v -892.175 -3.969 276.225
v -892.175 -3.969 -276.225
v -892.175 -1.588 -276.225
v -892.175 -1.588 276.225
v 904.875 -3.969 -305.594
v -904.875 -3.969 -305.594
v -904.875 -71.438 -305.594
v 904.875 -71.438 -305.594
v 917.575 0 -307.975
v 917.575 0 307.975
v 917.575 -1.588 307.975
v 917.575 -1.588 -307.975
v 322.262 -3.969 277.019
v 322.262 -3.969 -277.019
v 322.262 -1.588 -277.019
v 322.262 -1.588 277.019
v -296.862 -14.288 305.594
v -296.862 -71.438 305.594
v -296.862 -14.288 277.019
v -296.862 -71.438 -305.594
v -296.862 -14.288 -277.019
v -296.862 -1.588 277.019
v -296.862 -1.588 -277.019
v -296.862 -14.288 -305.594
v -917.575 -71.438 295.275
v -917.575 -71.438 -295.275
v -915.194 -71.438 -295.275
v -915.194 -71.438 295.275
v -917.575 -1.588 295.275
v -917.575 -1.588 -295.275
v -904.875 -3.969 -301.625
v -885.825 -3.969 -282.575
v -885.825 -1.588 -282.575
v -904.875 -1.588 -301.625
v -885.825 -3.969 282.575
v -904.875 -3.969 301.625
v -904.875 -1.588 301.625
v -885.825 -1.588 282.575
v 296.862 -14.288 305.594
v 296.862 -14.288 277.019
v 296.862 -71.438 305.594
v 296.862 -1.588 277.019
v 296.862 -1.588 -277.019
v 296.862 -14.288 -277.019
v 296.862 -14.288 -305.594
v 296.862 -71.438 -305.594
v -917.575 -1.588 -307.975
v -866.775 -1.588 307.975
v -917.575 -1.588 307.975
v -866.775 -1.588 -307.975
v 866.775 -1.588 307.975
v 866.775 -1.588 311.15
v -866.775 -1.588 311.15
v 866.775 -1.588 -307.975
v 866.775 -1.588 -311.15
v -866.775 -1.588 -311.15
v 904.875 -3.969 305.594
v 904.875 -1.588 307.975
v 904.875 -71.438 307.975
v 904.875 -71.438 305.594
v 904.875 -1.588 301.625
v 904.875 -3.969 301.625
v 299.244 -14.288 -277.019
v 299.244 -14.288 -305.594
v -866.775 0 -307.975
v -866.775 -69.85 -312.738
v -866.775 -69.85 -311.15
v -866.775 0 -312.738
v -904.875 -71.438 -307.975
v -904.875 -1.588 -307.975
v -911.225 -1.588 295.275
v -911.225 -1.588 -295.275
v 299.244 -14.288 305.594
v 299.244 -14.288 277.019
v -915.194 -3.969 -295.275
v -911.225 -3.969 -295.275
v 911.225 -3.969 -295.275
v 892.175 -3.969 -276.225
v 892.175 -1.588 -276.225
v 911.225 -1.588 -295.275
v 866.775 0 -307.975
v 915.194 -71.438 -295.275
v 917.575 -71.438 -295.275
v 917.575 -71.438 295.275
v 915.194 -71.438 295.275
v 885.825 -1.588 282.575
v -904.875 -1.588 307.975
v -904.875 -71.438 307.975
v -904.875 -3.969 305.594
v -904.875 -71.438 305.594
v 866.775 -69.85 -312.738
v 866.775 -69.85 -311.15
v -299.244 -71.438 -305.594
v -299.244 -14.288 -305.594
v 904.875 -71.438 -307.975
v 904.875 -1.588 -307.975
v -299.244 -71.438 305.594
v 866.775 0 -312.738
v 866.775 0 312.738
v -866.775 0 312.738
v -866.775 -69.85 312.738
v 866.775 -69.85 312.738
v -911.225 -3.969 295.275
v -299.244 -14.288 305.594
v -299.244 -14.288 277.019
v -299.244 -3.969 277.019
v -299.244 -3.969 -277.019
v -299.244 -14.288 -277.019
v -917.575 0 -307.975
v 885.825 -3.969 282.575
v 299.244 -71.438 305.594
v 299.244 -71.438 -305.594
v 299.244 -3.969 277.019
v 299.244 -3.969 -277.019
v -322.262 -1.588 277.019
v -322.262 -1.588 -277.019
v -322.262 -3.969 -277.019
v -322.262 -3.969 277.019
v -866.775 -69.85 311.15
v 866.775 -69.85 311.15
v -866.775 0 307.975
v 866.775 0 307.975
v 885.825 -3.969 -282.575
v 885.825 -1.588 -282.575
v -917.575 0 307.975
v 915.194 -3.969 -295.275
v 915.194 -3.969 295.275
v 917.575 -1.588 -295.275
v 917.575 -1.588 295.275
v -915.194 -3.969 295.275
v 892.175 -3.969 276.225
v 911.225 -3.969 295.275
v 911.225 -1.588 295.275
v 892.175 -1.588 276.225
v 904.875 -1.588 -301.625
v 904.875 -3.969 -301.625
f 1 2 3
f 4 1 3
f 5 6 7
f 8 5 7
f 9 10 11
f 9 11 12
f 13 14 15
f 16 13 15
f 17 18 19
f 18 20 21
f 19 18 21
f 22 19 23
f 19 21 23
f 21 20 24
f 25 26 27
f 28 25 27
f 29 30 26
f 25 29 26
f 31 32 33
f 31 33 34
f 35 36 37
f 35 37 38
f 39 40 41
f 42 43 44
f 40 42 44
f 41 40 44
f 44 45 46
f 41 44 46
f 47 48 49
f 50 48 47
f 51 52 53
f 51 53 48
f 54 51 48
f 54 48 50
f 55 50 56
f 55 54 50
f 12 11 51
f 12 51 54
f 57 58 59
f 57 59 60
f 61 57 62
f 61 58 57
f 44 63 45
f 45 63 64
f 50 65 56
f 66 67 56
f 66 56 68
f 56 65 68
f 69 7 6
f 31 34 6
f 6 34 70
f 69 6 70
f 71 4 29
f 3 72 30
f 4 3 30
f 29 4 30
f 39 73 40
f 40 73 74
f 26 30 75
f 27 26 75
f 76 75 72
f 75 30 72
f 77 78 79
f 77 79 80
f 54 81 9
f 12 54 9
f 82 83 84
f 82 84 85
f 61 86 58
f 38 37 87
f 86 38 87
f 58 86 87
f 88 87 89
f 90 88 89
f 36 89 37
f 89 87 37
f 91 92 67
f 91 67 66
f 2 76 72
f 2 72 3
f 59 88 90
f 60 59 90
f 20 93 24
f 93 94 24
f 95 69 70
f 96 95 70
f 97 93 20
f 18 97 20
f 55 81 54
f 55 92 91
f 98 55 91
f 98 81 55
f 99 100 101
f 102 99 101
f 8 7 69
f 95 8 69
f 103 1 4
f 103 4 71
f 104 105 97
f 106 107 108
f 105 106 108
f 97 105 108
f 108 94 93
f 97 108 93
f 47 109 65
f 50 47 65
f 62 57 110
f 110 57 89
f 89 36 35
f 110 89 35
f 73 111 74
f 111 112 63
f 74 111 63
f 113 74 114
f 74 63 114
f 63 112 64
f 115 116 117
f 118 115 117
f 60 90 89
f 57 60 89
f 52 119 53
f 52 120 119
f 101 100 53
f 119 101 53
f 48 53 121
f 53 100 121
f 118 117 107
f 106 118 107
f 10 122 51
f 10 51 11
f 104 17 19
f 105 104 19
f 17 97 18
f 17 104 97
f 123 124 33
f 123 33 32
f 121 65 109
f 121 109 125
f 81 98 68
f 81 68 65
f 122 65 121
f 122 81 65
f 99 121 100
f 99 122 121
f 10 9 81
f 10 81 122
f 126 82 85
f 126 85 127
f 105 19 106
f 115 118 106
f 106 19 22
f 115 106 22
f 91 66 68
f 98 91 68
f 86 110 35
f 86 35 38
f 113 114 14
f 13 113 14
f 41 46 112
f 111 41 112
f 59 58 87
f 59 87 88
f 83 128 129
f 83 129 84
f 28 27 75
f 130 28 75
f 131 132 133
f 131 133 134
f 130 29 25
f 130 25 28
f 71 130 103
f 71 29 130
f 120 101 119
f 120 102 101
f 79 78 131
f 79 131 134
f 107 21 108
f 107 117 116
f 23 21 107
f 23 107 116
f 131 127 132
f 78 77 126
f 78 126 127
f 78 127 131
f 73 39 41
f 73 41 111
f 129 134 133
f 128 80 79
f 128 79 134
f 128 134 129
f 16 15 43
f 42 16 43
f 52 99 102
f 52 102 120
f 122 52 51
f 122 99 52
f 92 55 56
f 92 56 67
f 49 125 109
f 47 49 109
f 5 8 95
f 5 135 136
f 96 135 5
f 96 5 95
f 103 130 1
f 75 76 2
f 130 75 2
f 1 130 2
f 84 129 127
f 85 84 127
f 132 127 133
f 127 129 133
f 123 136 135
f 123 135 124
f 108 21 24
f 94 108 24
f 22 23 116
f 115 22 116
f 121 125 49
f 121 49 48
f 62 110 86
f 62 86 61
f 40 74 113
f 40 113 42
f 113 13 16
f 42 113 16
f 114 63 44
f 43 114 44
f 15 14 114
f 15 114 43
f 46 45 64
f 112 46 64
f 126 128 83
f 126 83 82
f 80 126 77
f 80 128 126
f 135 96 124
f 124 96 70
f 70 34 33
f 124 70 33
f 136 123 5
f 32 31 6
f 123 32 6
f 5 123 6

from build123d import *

# Parameters (mm, degrees)
SKETCH1_W                  = 1835.15
SKETCH1_H                  = 615.95
BOSS_EXTRUDE1_DEPTH        = 1.5875
BOSS_EXTRUDE2_DEPTH        = 866.775
BOSS_EXTRUDE3_DEPTH        = 904.875
BOSS_EXTRUDE3_DEPTH_BACK   = 904.875
BOSS_EXTRUDE3_2_DEPTH      = 904.875
BOSS_EXTRUDE3_2_DEPTH_BACK = 904.875
BOSS_EXTRUDE4_DEPTH        = 295.275
BOSS_EXTRUDE4_DEPTH_BACK   = 295.275
BOSS_EXTRUDE4_2_DEPTH      = 295.275
BOSS_EXTRUDE4_2_DEPTH_BACK = 295.275
CUT_EXTRUDE1_START         = -3.96875
CUT_EXTRUDE1_DEPTH         = 2.38125
CUT_EXTRUDE1_2_DEPTH       = 2.38125
CUT_EXTRUDE1_3_DEPTH       = 2.38125
CUT_EXTRUDE1_4_DEPTH       = 2.38125
BOSS_EXTRUDE5_START        = -305.59375
BOSS_EXTRUDE5_DEPTH        = 611.1875
SKETCH9_W                  = 28.575
SKETCH9_H                  = 12.7
CUT_EXTRUDE2_DEPTH         = 1281.6658763


# Read off the part's stored shape, not the designer's step: Cut-Extrude1, Boss-Extrude5
with BuildPart() as part:
    # Sketch1 → Boss-Extrude1 (new body)
    with BuildSketch(Plane(origin=(0, 0, 0), x_dir=(1, 0, 0), z_dir=(0, 1, 0))):
        Rectangle(SKETCH1_W, SKETCH1_H)
    extrude(amount=-BOSS_EXTRUDE1_DEPTH)

    # Sketch2 → Boss-Extrude2 (add, symmetric)
    with BuildSketch(Plane(origin=(0, 0, 0), x_dir=(0, 0, -1), z_dir=(1, 0, 0))):
        Polygon((-311.15, -1.5875), (311.15, -1.5875), (311.15, -69.85), (312.7375, -69.85), (312.7375, 0), (-312.7375, 0), (-312.7375, -69.85), (-311.15, -69.85), align=None)
    extrude(amount=BOSS_EXTRUDE2_DEPTH, both=True)


with BuildPart() as body_2:
    # Sketch3 → Boss-Extrude3 (new, two sides: drawn at the far end of the back side and taken through both)
    with BuildSketch(Plane(origin=(0, 0, 0), x_dir=(0, 0, -1), z_dir=(1, 0, 0)).offset(-BOSS_EXTRUDE3_DEPTH_BACK)):
        Polygon((307.975, -71.4375), (307.975, -1.5875), (282.575, -1.5875), (282.575, -3.96875), (305.59375, -3.96875), (305.59375, -71.4375), align=None)
    extrude(amount=BOSS_EXTRUDE3_DEPTH + BOSS_EXTRUDE3_DEPTH_BACK)

    # Cut-Extrude1 4 outline → Cut-Extrude1 4 (cut)
    with BuildSketch(Plane(origin=(0, 0, 0), x_dir=(1, 0, 0), z_dir=(0, 1, 0)).offset(CUT_EXTRUDE1_START)):
        Polygon((-904.875, 282.575), (-885.825, 282.575), (-904.875, 301.625), align=None)
        Polygon((904.875, 301.625), (885.825, 282.575), (904.875, 282.575), align=None)
    extrude(amount=CUT_EXTRUDE1_4_DEPTH, mode=Mode.SUBTRACT)


with BuildPart() as body_3:
    # Sketch3 → Boss-Extrude3 2 (new, two sides: drawn at the far end of the back side and taken through both)
    with BuildSketch(Plane(origin=(0, 0, 0), x_dir=(0, 0, -1), z_dir=(1, 0, 0)).offset(-BOSS_EXTRUDE3_2_DEPTH_BACK)):
        Polygon((-282.575, -1.5875), (-307.975, -1.5875), (-307.975, -71.4375), (-305.59375, -71.4375), (-305.59375, -3.96875), (-282.575, -3.96875), align=None)
    extrude(amount=BOSS_EXTRUDE3_2_DEPTH + BOSS_EXTRUDE3_2_DEPTH_BACK)

    # Cut-Extrude1 3 outline → Cut-Extrude1 3 (cut)
    with BuildSketch(Plane(origin=(0, 0, 0), x_dir=(1, 0, 0), z_dir=(0, 1, 0)).offset(CUT_EXTRUDE1_START)):
        Polygon((-904.875, -282.575), (-904.875, -301.625), (-885.825, -282.575), align=None)
        Polygon((904.875, -282.575), (885.825, -282.575), (904.875, -301.625), align=None)
    extrude(amount=CUT_EXTRUDE1_3_DEPTH, mode=Mode.SUBTRACT)


with BuildPart() as body_4:
    # Sketch4 → Boss-Extrude4 (new, two sides: drawn at the far end of the back side and taken through both)
    with BuildSketch(Plane.XY.offset(-BOSS_EXTRUDE4_DEPTH_BACK)):
        Polygon((892.175, -1.5875), (917.575, -1.5875), (917.575, -71.4375), (915.19375, -71.4375), (915.19375, -3.96875), (892.175, -3.96875), align=None)
    extrude(amount=BOSS_EXTRUDE4_DEPTH + BOSS_EXTRUDE4_DEPTH_BACK)

    # Cut-Extrude1 2 outline → Cut-Extrude1 2 (cut)
    with BuildSketch(Plane(origin=(0, 0, 0), x_dir=(1, 0, 0), z_dir=(0, 1, 0)).offset(CUT_EXTRUDE1_START)):
        Polygon((892.175, 295.275), (892.175, 276.225), (911.225, 295.275), align=None)
        Polygon((911.225, -295.275), (892.175, -276.225), (892.175, -295.275), align=None)
    extrude(amount=CUT_EXTRUDE1_2_DEPTH, mode=Mode.SUBTRACT)


with BuildPart() as body_5:
    # Sketch4 → Boss-Extrude4 2 (new, two sides: drawn at the far end of the back side and taken through both)
    with BuildSketch(Plane.XY.offset(-BOSS_EXTRUDE4_2_DEPTH_BACK)):
        Polygon((-917.575, -1.5875), (-917.575, -71.4375), (-915.19375, -71.4375), (-915.19375, -3.96875), (-892.175, -3.96875), (-892.175, -1.5875), align=None)
    extrude(amount=BOSS_EXTRUDE4_2_DEPTH + BOSS_EXTRUDE4_2_DEPTH_BACK)

    # Cut-Extrude1 outline → Cut-Extrude1 (cut)
    with BuildSketch(Plane(origin=(0, 0, 0), x_dir=(1, 0, 0), z_dir=(0, 1, 0)).offset(CUT_EXTRUDE1_START)):
        Polygon((-892.175, 295.275), (-911.225, 295.275), (-892.175, 276.225), align=None)
        Polygon((-892.175, -295.275), (-892.175, -276.225), (-911.225, -295.275), align=None)
    extrude(amount=CUT_EXTRUDE1_DEPTH, mode=Mode.SUBTRACT)


with BuildPart() as body_6:
    # Boss-Extrude5 outline → Boss-Extrude5 (new body)
    with BuildSketch(Plane.XY.offset(BOSS_EXTRUDE5_START)):
        Polygon((-296.8625, -71.4375), (-296.8625, -1.5875), (-322.2625, -1.5875), (-322.2625, -3.96875), (-299.24375, -3.96875), (-299.24375, -71.4375), align=None)
        Polygon((322.2625, -1.5875), (296.8625, -1.5875), (296.8625, -71.4375), (299.24375, -71.4375), (299.24375, -3.96875), (322.2625, -3.96875), align=None)
    extrude(amount=BOSS_EXTRUDE5_DEPTH)

    # Sketch9 → Cut-Extrude2 (cut, through all)
    with BuildSketch(Plane(origin=(322.2625, 0, 0), x_dir=(0, 0, -1), z_dir=(1, 0, 0))):
        with Locations((-291.30625, -7.9375)):
            Rectangle(SKETCH9_W, SKETCH9_H)
        with Locations((291.30625, -7.9375)):
            Rectangle(SKETCH9_W, SKETCH9_H)
    extrude(amount=-CUT_EXTRUDE2_DEPTH, mode=Mode.SUBTRACT)


solid = Compound([part.part, body_2.part, body_3.part, body_4.part, body_5.part, body_6.part])
